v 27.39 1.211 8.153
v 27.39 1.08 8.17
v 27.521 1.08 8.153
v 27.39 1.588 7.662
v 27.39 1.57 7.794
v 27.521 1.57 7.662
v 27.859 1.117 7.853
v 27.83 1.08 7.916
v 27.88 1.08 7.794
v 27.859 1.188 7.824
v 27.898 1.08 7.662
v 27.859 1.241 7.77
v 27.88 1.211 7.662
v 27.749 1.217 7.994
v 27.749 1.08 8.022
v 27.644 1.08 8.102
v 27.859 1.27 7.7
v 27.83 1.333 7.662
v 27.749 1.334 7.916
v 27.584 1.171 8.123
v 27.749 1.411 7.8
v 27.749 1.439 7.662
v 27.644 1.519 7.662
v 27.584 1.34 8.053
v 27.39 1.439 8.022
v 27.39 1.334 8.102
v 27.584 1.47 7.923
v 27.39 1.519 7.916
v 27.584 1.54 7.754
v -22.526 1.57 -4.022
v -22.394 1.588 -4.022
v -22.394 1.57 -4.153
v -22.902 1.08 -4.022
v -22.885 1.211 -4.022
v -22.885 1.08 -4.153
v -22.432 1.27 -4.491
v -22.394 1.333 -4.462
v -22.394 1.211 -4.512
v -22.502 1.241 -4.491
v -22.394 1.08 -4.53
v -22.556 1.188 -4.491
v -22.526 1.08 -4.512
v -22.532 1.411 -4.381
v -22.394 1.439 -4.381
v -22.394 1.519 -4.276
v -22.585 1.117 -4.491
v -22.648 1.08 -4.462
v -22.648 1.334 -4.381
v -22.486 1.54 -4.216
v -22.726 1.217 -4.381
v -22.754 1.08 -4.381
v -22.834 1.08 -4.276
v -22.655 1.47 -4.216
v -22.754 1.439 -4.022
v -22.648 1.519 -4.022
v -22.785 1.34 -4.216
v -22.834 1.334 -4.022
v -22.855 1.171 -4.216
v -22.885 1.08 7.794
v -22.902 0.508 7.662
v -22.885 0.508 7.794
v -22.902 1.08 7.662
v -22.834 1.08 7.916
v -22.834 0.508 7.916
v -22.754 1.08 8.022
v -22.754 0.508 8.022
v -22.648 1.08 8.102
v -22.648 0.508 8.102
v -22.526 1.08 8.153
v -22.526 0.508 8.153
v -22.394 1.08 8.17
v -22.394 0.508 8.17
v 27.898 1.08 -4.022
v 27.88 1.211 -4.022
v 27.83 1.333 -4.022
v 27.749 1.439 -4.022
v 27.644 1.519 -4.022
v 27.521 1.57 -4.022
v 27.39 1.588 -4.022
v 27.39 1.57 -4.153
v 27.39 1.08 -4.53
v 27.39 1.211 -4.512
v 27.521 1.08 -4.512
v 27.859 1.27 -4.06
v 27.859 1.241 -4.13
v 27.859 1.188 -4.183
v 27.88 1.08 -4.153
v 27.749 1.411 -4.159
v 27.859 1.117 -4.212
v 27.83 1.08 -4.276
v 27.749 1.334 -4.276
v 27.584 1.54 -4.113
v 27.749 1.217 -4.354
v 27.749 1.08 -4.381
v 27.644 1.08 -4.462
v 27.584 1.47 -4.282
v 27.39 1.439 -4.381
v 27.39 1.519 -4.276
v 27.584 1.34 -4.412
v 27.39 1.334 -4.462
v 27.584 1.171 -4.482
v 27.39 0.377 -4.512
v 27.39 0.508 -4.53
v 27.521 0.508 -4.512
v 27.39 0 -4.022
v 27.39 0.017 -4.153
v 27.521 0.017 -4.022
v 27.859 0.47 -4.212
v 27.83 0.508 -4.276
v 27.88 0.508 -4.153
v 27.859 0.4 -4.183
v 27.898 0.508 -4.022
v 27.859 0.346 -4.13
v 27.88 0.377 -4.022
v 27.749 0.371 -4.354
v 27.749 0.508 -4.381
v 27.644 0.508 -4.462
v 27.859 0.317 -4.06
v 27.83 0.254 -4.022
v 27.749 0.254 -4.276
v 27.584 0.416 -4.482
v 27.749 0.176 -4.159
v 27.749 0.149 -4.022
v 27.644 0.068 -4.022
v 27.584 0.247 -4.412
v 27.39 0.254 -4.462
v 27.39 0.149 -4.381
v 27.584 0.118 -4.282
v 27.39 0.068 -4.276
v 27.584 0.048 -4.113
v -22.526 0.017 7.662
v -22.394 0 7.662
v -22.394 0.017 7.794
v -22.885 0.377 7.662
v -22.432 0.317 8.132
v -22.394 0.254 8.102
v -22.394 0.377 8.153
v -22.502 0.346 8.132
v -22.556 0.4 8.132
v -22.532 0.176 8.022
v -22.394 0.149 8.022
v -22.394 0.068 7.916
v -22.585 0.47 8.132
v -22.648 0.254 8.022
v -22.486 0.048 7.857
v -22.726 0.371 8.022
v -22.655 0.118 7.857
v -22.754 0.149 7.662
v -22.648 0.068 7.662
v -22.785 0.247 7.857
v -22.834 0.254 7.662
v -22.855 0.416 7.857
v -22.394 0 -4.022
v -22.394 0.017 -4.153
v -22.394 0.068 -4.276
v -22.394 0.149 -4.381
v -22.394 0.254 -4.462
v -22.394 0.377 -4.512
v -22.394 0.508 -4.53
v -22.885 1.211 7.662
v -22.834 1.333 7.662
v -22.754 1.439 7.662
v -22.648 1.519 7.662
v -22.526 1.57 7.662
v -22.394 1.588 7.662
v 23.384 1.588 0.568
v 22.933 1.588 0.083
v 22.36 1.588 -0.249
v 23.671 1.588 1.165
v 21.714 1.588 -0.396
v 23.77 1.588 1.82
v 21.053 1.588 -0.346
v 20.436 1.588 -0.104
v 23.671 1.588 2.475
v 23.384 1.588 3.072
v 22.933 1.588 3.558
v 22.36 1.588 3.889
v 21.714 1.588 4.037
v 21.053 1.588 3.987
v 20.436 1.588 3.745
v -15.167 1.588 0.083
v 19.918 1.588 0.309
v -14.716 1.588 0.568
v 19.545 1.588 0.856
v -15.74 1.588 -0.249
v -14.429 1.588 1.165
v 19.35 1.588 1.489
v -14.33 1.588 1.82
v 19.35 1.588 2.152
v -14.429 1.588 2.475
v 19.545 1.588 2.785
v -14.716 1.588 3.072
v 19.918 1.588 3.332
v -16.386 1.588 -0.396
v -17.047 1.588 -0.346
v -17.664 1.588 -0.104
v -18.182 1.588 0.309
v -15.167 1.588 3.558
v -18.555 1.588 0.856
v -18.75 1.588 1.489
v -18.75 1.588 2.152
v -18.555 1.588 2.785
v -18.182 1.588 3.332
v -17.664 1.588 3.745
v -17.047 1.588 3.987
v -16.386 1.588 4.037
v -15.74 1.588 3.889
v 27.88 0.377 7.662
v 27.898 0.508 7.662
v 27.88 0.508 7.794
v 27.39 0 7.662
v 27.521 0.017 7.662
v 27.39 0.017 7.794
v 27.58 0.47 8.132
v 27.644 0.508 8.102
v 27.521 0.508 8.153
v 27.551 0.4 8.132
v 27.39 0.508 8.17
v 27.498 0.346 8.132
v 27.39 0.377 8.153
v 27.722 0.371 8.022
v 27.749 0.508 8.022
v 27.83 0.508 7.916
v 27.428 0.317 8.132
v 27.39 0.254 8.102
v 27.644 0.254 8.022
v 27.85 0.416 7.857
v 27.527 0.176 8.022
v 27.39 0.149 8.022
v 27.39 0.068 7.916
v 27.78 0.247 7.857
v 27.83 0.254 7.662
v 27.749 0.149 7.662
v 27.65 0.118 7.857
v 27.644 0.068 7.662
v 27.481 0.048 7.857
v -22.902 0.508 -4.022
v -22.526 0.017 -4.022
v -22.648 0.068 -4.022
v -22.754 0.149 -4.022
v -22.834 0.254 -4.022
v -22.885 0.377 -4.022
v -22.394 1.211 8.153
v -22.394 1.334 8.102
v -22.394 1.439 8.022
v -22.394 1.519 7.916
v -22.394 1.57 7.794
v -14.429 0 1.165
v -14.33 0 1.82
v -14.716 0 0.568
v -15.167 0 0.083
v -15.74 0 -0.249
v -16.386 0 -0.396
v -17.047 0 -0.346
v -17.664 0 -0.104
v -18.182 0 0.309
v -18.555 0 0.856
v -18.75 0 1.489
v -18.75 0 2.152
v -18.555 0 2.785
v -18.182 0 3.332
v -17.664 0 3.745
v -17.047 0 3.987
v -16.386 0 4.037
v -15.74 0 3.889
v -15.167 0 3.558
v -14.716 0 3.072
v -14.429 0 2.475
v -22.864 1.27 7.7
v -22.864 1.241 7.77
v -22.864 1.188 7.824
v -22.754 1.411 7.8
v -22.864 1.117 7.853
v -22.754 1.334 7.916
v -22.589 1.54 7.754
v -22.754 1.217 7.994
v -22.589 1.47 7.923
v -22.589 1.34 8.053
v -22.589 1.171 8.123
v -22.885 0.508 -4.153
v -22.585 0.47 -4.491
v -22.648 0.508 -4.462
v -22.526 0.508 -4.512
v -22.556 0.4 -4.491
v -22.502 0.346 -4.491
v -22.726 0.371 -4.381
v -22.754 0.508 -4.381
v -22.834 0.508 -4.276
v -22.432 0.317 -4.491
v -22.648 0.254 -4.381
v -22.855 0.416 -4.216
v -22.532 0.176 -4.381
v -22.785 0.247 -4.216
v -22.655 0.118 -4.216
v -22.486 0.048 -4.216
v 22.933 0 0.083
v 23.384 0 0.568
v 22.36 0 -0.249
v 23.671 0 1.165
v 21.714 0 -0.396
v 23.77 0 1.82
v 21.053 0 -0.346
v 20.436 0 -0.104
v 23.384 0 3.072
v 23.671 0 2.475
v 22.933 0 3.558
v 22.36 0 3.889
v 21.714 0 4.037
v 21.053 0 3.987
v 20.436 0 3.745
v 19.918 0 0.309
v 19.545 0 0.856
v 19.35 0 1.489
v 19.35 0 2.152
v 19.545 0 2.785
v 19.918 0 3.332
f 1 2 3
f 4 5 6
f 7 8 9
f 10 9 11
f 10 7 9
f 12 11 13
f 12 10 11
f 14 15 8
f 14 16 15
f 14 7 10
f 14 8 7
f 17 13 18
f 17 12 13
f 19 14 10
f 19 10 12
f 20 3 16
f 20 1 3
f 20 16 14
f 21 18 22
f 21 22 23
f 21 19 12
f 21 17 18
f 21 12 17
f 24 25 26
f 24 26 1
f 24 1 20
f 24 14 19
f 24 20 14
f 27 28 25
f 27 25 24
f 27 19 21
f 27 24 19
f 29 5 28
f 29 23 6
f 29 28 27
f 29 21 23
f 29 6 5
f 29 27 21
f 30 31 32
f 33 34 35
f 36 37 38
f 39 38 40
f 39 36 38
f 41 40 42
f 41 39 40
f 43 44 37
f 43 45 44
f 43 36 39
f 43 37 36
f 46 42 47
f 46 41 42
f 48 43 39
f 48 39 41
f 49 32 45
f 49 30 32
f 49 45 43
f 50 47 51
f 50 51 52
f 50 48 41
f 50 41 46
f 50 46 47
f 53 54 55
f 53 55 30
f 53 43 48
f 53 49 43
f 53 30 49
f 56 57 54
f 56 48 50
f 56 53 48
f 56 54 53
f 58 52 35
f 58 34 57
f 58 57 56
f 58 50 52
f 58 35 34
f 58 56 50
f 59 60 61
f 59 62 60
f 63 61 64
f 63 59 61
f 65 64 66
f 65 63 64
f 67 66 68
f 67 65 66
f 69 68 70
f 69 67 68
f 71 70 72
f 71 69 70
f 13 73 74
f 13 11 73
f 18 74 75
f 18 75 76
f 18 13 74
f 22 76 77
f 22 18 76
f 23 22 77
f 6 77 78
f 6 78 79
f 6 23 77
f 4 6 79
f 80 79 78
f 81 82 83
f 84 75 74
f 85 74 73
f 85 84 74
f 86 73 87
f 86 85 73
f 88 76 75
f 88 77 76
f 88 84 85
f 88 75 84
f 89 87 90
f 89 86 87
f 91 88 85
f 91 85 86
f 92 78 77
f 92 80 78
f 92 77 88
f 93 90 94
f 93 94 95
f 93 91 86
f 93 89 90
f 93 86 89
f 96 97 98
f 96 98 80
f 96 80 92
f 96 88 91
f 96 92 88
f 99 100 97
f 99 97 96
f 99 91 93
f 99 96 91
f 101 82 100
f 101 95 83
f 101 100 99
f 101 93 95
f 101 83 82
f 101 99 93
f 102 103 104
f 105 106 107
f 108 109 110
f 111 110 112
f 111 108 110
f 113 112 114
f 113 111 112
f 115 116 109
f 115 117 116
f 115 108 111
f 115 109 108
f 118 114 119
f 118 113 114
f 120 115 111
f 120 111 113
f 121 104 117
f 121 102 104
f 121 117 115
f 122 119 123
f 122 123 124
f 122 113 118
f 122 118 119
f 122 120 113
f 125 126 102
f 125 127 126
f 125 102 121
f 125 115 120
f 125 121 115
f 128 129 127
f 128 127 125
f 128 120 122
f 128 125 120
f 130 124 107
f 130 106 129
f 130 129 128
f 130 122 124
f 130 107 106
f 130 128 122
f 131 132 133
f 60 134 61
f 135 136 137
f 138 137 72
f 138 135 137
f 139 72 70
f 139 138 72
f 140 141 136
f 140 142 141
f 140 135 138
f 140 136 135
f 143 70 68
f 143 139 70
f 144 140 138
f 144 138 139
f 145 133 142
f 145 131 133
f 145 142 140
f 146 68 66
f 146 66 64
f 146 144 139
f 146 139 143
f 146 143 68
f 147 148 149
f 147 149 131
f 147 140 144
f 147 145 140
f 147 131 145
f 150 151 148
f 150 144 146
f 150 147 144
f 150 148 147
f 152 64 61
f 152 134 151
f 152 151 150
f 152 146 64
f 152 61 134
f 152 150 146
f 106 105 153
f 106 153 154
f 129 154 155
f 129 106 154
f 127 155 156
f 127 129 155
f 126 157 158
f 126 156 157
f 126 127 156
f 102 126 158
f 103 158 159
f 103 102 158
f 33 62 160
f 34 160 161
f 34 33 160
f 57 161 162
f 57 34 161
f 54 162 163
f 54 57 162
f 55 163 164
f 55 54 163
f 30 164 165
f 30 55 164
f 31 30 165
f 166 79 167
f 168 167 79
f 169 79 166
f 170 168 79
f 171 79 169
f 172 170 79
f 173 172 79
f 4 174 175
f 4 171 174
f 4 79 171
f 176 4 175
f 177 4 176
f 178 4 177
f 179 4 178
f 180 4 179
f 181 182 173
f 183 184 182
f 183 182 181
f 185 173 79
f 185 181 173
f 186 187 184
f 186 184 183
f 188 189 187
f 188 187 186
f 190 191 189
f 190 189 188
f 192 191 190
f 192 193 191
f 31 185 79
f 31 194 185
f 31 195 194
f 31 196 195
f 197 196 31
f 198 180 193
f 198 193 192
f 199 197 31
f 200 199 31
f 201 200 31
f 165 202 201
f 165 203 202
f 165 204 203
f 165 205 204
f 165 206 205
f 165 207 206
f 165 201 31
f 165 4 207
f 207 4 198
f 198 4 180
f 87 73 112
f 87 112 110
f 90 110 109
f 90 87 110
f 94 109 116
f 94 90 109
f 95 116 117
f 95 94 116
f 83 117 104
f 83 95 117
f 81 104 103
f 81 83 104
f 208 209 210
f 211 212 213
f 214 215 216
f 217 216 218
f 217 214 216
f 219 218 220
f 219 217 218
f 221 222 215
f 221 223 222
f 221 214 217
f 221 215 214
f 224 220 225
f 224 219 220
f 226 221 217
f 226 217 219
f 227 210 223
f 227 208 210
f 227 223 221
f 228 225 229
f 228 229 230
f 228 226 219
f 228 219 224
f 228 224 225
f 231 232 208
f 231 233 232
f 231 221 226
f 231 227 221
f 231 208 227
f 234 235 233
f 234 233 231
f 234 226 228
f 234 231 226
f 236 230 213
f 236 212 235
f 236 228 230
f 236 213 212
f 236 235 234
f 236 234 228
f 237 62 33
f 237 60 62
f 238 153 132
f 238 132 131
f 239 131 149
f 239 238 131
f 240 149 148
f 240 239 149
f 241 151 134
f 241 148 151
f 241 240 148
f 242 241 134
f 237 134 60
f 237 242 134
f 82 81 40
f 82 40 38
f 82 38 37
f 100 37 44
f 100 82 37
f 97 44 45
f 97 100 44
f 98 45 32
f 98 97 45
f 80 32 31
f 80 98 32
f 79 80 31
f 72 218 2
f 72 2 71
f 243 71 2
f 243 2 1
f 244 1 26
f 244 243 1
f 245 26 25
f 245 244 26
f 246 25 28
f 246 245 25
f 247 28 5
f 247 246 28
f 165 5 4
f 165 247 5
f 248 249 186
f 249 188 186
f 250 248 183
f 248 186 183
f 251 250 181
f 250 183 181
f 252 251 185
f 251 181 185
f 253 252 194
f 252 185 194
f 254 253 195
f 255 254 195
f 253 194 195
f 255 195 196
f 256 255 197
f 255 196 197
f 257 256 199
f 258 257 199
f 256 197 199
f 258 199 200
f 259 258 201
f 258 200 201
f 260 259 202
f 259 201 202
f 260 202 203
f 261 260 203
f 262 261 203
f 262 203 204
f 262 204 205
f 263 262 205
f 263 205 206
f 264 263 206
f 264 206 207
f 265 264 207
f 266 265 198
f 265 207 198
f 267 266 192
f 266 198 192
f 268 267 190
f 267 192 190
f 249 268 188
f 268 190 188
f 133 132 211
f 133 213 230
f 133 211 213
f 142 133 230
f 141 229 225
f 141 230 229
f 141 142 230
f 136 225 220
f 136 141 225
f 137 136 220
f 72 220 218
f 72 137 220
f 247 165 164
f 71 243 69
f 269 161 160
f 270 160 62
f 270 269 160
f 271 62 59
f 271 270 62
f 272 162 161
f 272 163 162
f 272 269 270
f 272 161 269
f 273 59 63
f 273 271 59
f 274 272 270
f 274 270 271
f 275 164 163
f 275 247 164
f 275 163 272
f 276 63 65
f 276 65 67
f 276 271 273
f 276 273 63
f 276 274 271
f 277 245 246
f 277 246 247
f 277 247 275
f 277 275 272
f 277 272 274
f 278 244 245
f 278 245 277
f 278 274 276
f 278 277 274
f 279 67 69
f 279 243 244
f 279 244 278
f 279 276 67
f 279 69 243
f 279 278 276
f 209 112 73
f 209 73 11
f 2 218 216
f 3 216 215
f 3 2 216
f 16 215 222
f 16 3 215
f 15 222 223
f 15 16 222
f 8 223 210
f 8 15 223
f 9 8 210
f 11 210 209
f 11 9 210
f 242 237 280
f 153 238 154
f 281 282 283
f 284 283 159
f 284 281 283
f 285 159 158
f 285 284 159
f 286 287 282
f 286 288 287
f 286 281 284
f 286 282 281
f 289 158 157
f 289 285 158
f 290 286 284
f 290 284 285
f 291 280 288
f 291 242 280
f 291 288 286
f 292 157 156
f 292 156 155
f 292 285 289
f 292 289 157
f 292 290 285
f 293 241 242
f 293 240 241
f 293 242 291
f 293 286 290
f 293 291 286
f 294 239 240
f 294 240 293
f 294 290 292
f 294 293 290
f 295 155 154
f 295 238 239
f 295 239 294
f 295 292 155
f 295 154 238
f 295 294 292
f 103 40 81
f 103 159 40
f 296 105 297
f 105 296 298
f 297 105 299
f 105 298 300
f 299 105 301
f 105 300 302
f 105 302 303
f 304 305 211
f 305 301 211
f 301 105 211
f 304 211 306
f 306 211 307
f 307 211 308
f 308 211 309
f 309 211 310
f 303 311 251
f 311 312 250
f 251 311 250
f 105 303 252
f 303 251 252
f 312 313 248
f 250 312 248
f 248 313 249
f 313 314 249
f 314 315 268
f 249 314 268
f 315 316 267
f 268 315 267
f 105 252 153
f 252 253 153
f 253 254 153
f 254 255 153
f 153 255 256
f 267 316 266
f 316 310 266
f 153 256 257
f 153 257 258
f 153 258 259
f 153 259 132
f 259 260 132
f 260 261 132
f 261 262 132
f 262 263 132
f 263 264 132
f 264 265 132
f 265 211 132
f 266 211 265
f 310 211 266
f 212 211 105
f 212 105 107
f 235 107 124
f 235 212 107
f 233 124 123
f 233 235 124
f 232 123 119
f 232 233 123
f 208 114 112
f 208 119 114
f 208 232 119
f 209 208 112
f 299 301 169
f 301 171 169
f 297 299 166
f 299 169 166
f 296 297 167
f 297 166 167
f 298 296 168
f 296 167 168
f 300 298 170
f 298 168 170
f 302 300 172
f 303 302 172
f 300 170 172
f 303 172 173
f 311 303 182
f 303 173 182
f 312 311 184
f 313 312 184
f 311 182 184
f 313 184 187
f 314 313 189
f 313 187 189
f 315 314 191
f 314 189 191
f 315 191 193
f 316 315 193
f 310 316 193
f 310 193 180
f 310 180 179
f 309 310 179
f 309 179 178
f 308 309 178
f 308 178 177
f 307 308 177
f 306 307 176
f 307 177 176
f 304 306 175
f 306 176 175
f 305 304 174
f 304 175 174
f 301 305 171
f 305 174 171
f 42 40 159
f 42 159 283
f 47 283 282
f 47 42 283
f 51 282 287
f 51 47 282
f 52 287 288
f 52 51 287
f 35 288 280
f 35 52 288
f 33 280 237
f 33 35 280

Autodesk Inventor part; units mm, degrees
ref_plane "YZ Plane" through (0, 0, 0) normal (1, 0, 0) x (0, 1, 0)
ref_plane "XZ Plane" through (0, 0, 0) normal (0, 1, 0) x (-1, 0, 0)
ref_plane "XY Plane" through (0, 0, 0) normal (0, 0, 1) x (1, 0, 0)
sketch "Sketch1" plane through (0, 0, 0) normal (0, 1, 0) x (-1, 0, 0)
  line L0 (-27.8977, 8.1703) -> (22.9023, 8.1703)
  line L1 (22.9023, 8.1703) -> (22.9023, -4.5297)
  line L2 (22.9023, -4.5297) -> (-27.8977, -4.5297)
  line L3 (-27.8977, -4.5297) -> (-27.8977, 8.1703)
  point P0 (0, 0)
  dimension "d0" = 50.8
  dimension "d1" = 12.7
extrude "Extrusion1" add sketch "Sketch1" along normal blind 1.5875
sketch "Sketch2" plane through (0, 1.5875, 0) normal (0, 1, 0) x (1, 0, 0)
  line L0 (27.8977, -8.1703) -> (27.8977, 4.5297) projected
  line L1 (27.8977, 4.5297) -> (-22.9023, 4.5297) projected
  line L2 (-22.9023, 4.5297) -> (-22.9023, -8.1703) projected
  circle A0 centre (-16.5523, -1.8203) radius 2.2225
  circle A1 centre (21.5477, -1.8203) radius 2.2225
  point P0 (0, 0)
  dimension "d4" = 4.445
  dimension "d5" = 6.35
  dimension "d6" = 4.445
  dimension "d7" = 6.35
  dimension "d8" = 6.35
  dimension "d9" = 6.35
extrude "Extrusion2" cut sketch "Sketch2" against normal blind 1.5875
fillet "Fillet1" radius 0.508 12 edges at (2.4977, 1.5875, 8.1703) (-22.9023, 0, 1.8203) (-22.9023, 0.7937, 8.1703) (-22.9023, 1.5875, 1.8203) (-22.9023, 0.7937, -4.5297) (2.4977, 0, -4.5297) (2.4977, 1.5875, -4.5297) (27.8977, 0.7937, -4.5297) (27.8977, 0, 1.8203) (27.8977, 1.5875, 1.8203) (27.8977, 0.7937, 8.1703) (2.4977, 0, 8.1703)
properties part number "4 hole long poly"
